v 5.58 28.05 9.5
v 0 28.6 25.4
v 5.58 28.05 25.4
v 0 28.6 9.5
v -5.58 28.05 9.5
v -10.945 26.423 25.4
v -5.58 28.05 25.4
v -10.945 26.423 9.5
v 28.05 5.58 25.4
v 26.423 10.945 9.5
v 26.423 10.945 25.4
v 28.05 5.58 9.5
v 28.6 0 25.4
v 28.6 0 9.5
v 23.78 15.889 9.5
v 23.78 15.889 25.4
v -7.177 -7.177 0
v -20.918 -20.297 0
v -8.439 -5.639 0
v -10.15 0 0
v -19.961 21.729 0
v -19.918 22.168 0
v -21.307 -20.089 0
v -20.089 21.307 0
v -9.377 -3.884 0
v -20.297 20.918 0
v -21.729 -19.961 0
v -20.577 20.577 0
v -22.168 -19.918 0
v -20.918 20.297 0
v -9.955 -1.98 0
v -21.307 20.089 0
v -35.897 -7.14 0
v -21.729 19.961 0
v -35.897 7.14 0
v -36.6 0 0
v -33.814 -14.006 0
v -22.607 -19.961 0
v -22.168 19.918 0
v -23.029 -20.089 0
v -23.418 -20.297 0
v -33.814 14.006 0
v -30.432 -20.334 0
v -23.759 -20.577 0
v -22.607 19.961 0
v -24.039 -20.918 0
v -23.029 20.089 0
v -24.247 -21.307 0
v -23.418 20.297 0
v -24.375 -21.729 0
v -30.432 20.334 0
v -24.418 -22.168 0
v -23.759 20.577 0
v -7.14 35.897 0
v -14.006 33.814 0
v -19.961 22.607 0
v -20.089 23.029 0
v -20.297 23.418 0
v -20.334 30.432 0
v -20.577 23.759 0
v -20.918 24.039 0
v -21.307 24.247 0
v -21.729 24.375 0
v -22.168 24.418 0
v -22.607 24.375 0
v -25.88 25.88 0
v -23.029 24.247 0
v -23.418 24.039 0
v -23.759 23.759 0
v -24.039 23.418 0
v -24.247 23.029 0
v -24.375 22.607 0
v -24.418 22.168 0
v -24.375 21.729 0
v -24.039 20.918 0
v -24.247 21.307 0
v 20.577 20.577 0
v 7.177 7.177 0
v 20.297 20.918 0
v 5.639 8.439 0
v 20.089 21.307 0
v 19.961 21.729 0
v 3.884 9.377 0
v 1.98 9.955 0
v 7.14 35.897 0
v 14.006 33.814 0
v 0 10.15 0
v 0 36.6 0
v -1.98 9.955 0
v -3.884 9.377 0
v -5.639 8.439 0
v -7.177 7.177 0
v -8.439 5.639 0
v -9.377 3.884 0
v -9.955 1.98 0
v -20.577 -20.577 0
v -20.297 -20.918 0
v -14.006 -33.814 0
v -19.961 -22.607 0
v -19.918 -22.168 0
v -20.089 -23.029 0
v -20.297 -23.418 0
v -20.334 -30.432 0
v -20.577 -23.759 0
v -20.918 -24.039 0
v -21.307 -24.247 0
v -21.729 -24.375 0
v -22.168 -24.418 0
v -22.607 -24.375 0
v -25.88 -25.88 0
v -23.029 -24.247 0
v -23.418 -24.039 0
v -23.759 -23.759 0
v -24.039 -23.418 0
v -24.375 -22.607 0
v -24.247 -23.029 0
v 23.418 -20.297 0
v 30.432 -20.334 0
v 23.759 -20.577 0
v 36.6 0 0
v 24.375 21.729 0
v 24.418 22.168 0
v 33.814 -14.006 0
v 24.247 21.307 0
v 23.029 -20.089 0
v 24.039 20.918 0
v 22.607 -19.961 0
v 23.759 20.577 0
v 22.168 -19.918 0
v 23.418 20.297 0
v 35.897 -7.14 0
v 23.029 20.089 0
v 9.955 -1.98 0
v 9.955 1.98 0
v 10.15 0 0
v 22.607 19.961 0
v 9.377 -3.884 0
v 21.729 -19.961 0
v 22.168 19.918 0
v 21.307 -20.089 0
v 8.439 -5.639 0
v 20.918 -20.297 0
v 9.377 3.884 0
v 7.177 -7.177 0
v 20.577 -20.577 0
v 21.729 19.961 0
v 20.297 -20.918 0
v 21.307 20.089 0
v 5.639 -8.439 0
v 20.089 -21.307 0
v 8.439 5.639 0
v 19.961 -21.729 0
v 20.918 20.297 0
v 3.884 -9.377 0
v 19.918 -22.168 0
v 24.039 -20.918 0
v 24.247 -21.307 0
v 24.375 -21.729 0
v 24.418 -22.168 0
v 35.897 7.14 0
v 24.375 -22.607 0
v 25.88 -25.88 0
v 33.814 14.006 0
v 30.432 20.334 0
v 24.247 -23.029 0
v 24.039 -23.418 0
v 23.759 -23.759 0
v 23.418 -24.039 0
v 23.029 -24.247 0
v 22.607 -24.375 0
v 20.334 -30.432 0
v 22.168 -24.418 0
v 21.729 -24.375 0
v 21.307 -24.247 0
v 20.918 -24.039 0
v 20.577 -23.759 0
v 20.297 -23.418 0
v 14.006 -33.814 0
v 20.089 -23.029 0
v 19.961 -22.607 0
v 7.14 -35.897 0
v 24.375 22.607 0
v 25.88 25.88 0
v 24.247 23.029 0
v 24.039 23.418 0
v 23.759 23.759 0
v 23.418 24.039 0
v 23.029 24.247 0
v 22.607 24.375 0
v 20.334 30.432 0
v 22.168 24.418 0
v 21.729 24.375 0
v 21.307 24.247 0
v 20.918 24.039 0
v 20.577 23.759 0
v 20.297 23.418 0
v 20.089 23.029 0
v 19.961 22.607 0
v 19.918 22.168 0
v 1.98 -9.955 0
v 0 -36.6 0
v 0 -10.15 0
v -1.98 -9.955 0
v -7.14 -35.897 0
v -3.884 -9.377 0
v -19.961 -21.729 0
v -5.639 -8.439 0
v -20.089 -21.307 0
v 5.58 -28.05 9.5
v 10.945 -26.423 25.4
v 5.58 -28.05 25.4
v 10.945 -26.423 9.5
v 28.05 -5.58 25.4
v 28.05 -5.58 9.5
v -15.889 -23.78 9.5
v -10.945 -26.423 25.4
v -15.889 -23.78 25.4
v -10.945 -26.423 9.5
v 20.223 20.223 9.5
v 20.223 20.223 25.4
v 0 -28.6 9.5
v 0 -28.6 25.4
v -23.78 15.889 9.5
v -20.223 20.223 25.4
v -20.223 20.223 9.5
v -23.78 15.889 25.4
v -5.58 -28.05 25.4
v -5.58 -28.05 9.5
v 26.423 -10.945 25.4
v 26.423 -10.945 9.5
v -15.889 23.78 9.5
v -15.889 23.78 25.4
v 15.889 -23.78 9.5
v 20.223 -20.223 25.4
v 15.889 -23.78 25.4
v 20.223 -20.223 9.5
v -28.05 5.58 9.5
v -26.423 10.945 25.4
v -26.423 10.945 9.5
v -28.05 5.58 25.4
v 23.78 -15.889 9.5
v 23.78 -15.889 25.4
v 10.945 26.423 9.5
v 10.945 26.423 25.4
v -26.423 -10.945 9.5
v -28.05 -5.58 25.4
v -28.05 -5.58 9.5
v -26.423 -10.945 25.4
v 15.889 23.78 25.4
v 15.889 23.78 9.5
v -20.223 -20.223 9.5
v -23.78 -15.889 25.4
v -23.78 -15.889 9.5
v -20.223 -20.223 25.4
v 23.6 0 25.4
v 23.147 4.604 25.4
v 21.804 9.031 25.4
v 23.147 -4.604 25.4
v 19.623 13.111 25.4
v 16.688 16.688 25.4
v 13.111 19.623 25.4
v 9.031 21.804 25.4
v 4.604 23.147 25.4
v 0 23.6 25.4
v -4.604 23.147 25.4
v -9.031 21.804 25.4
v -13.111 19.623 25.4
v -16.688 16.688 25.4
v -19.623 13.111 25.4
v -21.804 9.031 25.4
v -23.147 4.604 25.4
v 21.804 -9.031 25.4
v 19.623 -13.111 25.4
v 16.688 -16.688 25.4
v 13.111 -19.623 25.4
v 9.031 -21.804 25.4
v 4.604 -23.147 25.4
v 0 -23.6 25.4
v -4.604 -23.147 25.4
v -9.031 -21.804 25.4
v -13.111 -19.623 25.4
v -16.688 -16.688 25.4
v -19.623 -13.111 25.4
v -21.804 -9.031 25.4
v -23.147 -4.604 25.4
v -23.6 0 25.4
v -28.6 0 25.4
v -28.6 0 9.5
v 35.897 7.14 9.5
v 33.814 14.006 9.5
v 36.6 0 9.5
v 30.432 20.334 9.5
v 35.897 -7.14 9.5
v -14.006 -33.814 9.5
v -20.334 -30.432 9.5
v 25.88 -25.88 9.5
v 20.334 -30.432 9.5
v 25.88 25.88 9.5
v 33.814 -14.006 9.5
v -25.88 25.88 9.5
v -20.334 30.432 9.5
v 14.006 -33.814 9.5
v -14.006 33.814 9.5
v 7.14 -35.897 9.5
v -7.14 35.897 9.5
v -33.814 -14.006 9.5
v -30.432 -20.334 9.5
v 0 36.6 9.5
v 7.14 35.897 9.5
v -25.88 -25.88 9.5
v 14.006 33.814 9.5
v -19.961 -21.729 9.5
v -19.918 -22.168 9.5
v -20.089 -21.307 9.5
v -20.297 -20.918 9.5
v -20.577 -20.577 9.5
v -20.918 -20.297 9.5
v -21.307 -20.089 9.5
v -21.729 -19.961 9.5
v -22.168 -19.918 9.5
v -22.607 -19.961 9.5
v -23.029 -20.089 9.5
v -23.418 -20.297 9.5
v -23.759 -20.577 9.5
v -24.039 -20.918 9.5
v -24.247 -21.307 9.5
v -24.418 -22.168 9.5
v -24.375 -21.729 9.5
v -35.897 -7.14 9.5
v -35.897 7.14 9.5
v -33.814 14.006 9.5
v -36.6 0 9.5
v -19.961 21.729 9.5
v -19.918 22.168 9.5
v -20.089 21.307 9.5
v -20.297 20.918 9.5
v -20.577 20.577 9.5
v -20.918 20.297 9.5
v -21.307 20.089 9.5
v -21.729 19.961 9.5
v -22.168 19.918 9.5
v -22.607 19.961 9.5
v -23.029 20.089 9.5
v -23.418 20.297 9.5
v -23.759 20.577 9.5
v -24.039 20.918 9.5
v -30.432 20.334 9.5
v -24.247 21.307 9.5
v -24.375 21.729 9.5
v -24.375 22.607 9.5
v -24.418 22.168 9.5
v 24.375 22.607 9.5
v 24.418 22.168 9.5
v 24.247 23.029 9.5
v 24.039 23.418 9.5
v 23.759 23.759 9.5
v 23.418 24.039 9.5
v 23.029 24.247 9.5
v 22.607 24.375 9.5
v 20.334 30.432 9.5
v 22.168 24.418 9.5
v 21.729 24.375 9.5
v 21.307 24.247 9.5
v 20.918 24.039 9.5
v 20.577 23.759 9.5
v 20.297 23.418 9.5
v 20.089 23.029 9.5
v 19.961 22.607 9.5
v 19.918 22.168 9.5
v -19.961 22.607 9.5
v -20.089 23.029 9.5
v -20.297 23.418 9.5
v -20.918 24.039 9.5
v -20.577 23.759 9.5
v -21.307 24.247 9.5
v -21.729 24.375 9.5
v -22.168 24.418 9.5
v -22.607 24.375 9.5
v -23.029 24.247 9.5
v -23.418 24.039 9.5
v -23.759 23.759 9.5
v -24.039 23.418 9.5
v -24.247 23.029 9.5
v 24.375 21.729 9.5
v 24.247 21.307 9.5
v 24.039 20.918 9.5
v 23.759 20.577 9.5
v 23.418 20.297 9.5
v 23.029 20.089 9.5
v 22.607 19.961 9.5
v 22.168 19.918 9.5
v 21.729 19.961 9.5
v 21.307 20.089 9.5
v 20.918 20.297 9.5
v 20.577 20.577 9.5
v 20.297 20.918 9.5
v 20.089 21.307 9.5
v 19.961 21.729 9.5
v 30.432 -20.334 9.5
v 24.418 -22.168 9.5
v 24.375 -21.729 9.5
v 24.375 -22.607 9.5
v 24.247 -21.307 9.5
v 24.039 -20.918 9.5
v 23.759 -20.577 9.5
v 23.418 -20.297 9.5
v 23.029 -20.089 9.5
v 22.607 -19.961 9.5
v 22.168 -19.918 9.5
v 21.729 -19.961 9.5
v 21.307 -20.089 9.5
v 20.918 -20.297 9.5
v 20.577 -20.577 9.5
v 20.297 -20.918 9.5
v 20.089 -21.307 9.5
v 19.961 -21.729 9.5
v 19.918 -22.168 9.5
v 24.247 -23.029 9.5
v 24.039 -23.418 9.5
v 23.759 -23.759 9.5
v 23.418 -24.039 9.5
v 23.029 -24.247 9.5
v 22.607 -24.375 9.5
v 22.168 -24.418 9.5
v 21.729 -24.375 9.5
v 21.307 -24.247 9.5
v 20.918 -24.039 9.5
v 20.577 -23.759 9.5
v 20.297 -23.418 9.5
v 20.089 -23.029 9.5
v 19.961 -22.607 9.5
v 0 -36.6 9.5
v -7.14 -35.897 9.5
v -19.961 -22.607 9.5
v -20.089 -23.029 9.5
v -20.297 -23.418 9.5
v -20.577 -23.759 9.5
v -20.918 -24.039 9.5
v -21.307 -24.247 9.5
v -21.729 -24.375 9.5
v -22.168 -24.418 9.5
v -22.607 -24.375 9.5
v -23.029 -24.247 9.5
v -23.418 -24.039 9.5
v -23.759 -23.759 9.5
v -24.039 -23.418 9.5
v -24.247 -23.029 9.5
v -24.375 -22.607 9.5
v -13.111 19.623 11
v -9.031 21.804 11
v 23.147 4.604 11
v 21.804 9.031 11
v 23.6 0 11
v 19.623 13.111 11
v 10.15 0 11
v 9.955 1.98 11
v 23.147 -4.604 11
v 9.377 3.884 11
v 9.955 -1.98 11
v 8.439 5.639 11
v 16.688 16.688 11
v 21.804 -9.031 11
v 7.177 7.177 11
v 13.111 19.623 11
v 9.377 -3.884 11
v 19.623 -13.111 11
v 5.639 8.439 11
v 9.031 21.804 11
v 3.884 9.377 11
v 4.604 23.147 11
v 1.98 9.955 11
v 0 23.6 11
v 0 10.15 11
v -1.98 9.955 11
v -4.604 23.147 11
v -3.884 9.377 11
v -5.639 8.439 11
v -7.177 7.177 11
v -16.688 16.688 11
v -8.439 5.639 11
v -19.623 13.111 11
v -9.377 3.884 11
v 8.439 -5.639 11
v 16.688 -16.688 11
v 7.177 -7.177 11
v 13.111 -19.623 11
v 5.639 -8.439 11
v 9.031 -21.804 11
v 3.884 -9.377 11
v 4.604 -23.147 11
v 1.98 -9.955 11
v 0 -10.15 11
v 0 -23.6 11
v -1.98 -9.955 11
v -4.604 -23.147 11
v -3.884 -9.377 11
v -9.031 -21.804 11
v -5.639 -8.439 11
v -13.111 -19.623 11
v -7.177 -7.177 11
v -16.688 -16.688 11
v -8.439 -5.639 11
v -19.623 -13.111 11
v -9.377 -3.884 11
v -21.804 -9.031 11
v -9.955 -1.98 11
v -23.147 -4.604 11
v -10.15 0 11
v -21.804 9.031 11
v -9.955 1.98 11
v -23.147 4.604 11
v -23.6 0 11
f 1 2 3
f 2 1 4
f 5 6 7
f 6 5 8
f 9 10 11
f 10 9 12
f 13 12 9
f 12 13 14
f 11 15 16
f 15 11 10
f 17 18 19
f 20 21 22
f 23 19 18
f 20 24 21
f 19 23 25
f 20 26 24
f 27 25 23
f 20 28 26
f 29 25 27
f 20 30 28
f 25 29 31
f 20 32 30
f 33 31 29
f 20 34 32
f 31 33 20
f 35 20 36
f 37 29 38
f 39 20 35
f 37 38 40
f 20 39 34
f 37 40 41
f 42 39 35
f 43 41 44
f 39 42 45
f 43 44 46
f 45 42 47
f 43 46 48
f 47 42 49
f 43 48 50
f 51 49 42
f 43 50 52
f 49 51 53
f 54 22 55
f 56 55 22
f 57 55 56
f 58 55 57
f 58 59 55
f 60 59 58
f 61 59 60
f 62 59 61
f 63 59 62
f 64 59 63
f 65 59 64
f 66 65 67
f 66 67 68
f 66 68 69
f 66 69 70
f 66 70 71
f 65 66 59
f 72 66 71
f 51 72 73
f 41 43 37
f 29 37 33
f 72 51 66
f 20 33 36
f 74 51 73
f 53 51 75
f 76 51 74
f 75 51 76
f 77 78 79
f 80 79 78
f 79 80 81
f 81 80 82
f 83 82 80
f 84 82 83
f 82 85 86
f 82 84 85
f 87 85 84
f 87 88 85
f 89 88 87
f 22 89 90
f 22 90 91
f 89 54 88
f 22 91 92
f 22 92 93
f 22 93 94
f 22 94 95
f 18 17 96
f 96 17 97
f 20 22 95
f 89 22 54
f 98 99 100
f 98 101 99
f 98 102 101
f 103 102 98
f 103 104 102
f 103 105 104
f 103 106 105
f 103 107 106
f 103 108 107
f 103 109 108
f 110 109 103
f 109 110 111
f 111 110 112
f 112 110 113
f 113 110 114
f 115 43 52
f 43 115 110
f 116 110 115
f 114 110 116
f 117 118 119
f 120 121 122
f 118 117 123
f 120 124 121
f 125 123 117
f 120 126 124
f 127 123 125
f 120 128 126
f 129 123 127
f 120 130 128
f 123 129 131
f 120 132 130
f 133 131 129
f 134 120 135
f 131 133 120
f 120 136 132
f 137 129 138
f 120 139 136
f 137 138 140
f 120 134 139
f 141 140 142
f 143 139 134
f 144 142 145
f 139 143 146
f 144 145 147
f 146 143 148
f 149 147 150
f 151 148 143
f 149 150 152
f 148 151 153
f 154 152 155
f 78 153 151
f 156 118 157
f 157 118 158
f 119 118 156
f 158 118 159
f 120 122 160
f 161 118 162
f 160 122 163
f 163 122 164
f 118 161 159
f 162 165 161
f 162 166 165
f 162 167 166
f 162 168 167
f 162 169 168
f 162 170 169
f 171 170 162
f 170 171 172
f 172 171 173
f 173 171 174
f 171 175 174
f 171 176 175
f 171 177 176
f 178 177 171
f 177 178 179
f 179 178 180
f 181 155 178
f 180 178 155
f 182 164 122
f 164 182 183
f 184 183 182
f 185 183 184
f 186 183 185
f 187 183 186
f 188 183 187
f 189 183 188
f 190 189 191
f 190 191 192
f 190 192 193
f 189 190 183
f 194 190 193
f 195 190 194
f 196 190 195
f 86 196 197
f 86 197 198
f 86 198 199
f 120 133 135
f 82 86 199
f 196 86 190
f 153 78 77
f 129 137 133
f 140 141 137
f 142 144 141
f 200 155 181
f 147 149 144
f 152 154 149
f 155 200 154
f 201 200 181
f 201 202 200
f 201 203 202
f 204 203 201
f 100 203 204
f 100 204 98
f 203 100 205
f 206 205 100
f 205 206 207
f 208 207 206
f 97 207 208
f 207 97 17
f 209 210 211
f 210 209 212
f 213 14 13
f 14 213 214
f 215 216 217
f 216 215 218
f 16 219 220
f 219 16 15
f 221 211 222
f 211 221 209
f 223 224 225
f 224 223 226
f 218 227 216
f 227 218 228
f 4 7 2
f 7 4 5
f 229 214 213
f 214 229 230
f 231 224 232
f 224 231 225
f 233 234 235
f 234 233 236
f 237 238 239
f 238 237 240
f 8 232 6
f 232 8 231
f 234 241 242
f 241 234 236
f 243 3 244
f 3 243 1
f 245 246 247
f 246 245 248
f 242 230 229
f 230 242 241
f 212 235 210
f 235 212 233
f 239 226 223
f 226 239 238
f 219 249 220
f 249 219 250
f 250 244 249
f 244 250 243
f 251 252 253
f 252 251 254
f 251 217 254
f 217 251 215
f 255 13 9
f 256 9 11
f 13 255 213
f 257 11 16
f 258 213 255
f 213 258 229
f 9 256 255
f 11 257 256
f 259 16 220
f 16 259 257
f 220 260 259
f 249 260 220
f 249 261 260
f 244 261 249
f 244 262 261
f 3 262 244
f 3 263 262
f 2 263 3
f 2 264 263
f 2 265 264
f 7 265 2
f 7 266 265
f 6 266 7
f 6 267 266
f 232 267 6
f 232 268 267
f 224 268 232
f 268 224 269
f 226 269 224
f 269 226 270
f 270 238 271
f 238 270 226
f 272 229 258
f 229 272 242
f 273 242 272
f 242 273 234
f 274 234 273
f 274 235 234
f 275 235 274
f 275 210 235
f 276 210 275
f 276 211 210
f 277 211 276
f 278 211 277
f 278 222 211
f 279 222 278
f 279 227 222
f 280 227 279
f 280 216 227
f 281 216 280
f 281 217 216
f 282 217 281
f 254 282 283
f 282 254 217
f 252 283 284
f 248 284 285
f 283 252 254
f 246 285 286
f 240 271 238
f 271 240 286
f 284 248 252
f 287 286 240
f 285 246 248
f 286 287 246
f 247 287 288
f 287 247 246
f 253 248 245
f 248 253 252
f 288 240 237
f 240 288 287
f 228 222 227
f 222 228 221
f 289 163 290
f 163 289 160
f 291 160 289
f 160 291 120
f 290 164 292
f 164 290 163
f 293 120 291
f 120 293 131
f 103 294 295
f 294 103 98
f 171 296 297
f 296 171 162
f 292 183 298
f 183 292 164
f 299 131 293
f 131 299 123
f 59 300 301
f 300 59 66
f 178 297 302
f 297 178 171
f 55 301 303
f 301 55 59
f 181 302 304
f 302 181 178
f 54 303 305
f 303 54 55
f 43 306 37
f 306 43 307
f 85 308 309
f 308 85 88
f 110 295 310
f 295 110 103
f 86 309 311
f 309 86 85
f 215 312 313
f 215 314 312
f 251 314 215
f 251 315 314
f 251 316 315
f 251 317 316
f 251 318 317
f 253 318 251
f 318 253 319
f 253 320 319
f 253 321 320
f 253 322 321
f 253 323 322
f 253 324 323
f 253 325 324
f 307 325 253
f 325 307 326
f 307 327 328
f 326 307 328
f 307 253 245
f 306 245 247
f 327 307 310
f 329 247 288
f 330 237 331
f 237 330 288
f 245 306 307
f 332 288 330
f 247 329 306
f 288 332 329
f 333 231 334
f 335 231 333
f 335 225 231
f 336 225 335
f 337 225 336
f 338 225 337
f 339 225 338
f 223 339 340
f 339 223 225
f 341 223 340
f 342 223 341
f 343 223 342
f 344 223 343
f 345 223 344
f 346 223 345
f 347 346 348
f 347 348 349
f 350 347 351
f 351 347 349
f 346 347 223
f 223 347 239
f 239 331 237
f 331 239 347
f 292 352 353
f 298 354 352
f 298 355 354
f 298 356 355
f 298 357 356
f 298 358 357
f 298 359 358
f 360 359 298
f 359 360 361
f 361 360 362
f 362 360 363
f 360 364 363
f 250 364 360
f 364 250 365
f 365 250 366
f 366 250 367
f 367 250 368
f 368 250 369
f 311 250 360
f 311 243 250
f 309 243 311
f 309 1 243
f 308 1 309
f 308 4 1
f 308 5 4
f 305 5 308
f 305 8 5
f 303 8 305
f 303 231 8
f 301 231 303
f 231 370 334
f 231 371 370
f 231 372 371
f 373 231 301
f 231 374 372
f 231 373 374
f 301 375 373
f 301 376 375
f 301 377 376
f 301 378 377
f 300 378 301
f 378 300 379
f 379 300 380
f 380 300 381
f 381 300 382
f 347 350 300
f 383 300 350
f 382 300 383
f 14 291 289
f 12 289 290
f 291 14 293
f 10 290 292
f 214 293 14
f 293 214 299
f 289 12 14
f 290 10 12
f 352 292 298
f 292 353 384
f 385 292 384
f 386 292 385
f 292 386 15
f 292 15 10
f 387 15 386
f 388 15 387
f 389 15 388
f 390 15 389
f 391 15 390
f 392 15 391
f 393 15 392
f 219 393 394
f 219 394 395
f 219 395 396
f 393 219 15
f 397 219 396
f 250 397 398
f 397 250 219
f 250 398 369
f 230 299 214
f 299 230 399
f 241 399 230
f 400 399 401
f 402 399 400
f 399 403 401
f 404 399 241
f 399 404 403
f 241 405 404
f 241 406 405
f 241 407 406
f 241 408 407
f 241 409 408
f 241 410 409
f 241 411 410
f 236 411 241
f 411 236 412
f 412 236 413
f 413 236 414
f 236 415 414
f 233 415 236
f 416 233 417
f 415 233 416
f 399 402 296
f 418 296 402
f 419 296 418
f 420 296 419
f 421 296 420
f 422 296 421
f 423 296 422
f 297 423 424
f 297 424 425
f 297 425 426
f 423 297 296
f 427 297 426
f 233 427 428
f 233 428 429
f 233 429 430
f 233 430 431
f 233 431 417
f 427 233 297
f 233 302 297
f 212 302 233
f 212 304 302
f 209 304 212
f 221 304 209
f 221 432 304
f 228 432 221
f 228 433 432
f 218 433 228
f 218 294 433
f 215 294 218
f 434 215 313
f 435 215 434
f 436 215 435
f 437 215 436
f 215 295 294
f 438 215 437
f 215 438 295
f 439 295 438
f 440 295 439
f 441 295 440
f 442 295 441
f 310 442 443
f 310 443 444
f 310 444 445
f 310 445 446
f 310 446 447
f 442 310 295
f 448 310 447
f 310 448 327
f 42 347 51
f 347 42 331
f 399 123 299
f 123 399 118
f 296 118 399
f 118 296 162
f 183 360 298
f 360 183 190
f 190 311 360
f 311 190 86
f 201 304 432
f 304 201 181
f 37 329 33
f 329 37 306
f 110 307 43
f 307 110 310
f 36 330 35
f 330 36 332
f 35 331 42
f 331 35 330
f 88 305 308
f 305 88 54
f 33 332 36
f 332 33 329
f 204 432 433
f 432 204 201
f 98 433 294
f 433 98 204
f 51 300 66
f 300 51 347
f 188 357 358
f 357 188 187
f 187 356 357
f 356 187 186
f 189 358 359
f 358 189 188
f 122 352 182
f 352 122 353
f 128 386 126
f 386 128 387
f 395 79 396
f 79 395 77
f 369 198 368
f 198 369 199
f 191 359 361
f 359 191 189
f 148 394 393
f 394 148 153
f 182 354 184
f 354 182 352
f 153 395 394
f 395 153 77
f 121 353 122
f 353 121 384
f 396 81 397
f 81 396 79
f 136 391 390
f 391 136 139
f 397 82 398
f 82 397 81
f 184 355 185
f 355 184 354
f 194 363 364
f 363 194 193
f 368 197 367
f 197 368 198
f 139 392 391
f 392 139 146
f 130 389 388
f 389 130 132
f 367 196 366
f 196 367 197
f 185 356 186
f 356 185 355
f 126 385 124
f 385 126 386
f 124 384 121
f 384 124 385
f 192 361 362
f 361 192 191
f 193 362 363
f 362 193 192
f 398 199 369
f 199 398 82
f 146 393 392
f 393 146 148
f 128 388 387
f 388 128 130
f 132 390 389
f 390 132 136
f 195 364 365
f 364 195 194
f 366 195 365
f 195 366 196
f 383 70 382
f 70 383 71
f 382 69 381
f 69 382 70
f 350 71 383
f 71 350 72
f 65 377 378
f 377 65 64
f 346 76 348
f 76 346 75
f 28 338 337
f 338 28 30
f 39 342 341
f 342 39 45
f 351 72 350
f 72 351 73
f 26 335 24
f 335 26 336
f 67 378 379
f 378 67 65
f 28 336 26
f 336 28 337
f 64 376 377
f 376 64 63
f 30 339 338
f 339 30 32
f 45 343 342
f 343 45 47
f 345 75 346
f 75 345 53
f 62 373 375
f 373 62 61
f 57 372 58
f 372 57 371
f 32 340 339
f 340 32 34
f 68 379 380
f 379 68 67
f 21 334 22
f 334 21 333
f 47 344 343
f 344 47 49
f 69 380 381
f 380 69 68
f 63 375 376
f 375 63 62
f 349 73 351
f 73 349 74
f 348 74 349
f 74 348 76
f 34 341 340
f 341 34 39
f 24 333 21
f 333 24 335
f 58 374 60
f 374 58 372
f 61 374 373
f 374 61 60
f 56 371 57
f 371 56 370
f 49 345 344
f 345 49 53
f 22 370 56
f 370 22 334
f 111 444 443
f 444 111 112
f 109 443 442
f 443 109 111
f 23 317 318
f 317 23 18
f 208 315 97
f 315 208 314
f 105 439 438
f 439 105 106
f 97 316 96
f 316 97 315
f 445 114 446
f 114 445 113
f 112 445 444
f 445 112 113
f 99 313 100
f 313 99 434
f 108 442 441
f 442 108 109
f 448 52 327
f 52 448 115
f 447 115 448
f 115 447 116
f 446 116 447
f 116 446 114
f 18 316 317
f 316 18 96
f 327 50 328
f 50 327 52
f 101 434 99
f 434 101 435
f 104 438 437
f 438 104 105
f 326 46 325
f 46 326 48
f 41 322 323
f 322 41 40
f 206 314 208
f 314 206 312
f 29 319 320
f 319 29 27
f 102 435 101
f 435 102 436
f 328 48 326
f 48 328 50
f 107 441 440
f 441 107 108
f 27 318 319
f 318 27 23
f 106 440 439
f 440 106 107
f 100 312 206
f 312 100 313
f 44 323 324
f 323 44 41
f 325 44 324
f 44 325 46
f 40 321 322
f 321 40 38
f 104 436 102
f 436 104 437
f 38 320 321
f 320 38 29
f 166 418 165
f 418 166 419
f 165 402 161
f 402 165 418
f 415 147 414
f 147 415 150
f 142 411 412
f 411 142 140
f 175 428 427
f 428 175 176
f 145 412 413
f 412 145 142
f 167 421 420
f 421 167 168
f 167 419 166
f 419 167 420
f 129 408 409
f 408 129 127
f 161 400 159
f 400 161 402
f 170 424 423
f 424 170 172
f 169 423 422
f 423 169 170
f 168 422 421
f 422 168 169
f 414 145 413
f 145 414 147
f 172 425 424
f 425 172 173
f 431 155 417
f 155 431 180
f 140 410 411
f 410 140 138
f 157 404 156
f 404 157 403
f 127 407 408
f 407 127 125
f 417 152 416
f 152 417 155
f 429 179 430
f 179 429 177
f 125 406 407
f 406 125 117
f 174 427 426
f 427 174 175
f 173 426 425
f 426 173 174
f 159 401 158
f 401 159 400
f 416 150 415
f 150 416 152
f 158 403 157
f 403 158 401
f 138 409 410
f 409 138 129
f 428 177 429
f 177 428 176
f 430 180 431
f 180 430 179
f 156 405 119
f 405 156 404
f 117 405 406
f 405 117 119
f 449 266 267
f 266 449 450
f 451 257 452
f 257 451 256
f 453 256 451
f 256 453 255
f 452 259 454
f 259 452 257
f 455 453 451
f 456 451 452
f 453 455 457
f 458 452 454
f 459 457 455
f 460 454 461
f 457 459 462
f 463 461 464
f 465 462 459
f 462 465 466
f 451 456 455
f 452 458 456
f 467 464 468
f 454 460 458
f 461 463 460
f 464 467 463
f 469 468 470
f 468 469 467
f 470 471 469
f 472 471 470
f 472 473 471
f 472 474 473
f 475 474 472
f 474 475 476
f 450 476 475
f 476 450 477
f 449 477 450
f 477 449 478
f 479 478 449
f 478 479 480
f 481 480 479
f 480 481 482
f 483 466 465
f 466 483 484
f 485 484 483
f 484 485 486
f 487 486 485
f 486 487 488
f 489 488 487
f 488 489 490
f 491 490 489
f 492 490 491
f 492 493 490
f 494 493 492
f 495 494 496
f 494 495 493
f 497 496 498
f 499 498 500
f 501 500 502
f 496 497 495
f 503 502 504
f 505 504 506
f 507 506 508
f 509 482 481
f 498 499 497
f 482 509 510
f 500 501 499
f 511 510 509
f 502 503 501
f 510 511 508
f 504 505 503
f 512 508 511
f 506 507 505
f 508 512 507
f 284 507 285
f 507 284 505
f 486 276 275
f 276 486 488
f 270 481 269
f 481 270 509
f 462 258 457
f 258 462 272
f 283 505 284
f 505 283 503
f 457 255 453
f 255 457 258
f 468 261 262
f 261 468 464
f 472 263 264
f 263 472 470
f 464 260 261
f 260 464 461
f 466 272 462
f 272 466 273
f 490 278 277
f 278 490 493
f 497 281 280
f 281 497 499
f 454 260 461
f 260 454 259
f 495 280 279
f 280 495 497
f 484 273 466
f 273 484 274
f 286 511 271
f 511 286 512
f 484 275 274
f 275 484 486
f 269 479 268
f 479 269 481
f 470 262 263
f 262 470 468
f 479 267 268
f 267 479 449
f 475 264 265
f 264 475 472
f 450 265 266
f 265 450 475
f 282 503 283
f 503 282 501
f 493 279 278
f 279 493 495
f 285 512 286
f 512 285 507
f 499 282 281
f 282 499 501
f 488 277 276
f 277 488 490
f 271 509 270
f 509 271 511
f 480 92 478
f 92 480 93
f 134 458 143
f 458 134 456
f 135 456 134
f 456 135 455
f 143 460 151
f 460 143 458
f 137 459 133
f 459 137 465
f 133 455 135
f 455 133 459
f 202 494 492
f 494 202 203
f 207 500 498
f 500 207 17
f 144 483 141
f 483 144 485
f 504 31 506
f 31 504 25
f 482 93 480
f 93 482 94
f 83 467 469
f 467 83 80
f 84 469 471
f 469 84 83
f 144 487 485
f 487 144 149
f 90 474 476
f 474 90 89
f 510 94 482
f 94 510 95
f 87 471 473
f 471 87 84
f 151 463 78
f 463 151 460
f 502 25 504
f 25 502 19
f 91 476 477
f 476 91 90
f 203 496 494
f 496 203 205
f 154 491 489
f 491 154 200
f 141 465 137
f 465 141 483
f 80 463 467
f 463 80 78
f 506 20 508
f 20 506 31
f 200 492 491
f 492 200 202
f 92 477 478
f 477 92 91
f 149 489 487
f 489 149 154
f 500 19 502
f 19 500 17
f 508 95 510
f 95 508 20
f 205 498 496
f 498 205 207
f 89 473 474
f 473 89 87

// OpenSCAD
$fn = 32;

// ----------------------------------------------------------------------
// Bearing housing: seat for 6204 (47 x 14 mm), 57.2 mm body
// ----------------------------------------------------------------------

// --- parameters (mm) ---
housing_d = 57.2;         // housing outside diameter
housing_h = 25.4;         // overall housing height
wall_t = 5;               // wall thickness
seat_d = 47.2;            // 6204 seat, 0.2 mm clearance
seat_h = 14.4;            // pocket depth
shoulder = 3;             // shoulder under the bearing
pass_d = 20.3;            // shaft passage
flange_d = 73.2;          // mounting flange diameter
flange_t = 8;             // flange thickness
bolt_d = 4.5;             // flange bolt clearance
bolt_r = 31.35;           // flange bolt circle radius

module body() {
  cylinder(h = housing_h, d = housing_d);
}

module flange() {
  /* flange sunk 1.5 mm into the body */
  cylinder(h = flange_t + 1.5, d = flange_d);
}

difference() {
  union() {
    body();
    flange();
  }
  translate([0, 0, housing_h - seat_h]) cylinder(h = seat_h + 1, d = seat_d);
  translate([0, 0, -1]) cylinder(h = housing_h - seat_h + 1, d = pass_d);
  for (i = [0 : 3]) rotate([0, 0, 45 + i * 90]) translate([bolt_r, 0, -1])
    cylinder(h = flange_t + 3, d = bolt_d);
}
